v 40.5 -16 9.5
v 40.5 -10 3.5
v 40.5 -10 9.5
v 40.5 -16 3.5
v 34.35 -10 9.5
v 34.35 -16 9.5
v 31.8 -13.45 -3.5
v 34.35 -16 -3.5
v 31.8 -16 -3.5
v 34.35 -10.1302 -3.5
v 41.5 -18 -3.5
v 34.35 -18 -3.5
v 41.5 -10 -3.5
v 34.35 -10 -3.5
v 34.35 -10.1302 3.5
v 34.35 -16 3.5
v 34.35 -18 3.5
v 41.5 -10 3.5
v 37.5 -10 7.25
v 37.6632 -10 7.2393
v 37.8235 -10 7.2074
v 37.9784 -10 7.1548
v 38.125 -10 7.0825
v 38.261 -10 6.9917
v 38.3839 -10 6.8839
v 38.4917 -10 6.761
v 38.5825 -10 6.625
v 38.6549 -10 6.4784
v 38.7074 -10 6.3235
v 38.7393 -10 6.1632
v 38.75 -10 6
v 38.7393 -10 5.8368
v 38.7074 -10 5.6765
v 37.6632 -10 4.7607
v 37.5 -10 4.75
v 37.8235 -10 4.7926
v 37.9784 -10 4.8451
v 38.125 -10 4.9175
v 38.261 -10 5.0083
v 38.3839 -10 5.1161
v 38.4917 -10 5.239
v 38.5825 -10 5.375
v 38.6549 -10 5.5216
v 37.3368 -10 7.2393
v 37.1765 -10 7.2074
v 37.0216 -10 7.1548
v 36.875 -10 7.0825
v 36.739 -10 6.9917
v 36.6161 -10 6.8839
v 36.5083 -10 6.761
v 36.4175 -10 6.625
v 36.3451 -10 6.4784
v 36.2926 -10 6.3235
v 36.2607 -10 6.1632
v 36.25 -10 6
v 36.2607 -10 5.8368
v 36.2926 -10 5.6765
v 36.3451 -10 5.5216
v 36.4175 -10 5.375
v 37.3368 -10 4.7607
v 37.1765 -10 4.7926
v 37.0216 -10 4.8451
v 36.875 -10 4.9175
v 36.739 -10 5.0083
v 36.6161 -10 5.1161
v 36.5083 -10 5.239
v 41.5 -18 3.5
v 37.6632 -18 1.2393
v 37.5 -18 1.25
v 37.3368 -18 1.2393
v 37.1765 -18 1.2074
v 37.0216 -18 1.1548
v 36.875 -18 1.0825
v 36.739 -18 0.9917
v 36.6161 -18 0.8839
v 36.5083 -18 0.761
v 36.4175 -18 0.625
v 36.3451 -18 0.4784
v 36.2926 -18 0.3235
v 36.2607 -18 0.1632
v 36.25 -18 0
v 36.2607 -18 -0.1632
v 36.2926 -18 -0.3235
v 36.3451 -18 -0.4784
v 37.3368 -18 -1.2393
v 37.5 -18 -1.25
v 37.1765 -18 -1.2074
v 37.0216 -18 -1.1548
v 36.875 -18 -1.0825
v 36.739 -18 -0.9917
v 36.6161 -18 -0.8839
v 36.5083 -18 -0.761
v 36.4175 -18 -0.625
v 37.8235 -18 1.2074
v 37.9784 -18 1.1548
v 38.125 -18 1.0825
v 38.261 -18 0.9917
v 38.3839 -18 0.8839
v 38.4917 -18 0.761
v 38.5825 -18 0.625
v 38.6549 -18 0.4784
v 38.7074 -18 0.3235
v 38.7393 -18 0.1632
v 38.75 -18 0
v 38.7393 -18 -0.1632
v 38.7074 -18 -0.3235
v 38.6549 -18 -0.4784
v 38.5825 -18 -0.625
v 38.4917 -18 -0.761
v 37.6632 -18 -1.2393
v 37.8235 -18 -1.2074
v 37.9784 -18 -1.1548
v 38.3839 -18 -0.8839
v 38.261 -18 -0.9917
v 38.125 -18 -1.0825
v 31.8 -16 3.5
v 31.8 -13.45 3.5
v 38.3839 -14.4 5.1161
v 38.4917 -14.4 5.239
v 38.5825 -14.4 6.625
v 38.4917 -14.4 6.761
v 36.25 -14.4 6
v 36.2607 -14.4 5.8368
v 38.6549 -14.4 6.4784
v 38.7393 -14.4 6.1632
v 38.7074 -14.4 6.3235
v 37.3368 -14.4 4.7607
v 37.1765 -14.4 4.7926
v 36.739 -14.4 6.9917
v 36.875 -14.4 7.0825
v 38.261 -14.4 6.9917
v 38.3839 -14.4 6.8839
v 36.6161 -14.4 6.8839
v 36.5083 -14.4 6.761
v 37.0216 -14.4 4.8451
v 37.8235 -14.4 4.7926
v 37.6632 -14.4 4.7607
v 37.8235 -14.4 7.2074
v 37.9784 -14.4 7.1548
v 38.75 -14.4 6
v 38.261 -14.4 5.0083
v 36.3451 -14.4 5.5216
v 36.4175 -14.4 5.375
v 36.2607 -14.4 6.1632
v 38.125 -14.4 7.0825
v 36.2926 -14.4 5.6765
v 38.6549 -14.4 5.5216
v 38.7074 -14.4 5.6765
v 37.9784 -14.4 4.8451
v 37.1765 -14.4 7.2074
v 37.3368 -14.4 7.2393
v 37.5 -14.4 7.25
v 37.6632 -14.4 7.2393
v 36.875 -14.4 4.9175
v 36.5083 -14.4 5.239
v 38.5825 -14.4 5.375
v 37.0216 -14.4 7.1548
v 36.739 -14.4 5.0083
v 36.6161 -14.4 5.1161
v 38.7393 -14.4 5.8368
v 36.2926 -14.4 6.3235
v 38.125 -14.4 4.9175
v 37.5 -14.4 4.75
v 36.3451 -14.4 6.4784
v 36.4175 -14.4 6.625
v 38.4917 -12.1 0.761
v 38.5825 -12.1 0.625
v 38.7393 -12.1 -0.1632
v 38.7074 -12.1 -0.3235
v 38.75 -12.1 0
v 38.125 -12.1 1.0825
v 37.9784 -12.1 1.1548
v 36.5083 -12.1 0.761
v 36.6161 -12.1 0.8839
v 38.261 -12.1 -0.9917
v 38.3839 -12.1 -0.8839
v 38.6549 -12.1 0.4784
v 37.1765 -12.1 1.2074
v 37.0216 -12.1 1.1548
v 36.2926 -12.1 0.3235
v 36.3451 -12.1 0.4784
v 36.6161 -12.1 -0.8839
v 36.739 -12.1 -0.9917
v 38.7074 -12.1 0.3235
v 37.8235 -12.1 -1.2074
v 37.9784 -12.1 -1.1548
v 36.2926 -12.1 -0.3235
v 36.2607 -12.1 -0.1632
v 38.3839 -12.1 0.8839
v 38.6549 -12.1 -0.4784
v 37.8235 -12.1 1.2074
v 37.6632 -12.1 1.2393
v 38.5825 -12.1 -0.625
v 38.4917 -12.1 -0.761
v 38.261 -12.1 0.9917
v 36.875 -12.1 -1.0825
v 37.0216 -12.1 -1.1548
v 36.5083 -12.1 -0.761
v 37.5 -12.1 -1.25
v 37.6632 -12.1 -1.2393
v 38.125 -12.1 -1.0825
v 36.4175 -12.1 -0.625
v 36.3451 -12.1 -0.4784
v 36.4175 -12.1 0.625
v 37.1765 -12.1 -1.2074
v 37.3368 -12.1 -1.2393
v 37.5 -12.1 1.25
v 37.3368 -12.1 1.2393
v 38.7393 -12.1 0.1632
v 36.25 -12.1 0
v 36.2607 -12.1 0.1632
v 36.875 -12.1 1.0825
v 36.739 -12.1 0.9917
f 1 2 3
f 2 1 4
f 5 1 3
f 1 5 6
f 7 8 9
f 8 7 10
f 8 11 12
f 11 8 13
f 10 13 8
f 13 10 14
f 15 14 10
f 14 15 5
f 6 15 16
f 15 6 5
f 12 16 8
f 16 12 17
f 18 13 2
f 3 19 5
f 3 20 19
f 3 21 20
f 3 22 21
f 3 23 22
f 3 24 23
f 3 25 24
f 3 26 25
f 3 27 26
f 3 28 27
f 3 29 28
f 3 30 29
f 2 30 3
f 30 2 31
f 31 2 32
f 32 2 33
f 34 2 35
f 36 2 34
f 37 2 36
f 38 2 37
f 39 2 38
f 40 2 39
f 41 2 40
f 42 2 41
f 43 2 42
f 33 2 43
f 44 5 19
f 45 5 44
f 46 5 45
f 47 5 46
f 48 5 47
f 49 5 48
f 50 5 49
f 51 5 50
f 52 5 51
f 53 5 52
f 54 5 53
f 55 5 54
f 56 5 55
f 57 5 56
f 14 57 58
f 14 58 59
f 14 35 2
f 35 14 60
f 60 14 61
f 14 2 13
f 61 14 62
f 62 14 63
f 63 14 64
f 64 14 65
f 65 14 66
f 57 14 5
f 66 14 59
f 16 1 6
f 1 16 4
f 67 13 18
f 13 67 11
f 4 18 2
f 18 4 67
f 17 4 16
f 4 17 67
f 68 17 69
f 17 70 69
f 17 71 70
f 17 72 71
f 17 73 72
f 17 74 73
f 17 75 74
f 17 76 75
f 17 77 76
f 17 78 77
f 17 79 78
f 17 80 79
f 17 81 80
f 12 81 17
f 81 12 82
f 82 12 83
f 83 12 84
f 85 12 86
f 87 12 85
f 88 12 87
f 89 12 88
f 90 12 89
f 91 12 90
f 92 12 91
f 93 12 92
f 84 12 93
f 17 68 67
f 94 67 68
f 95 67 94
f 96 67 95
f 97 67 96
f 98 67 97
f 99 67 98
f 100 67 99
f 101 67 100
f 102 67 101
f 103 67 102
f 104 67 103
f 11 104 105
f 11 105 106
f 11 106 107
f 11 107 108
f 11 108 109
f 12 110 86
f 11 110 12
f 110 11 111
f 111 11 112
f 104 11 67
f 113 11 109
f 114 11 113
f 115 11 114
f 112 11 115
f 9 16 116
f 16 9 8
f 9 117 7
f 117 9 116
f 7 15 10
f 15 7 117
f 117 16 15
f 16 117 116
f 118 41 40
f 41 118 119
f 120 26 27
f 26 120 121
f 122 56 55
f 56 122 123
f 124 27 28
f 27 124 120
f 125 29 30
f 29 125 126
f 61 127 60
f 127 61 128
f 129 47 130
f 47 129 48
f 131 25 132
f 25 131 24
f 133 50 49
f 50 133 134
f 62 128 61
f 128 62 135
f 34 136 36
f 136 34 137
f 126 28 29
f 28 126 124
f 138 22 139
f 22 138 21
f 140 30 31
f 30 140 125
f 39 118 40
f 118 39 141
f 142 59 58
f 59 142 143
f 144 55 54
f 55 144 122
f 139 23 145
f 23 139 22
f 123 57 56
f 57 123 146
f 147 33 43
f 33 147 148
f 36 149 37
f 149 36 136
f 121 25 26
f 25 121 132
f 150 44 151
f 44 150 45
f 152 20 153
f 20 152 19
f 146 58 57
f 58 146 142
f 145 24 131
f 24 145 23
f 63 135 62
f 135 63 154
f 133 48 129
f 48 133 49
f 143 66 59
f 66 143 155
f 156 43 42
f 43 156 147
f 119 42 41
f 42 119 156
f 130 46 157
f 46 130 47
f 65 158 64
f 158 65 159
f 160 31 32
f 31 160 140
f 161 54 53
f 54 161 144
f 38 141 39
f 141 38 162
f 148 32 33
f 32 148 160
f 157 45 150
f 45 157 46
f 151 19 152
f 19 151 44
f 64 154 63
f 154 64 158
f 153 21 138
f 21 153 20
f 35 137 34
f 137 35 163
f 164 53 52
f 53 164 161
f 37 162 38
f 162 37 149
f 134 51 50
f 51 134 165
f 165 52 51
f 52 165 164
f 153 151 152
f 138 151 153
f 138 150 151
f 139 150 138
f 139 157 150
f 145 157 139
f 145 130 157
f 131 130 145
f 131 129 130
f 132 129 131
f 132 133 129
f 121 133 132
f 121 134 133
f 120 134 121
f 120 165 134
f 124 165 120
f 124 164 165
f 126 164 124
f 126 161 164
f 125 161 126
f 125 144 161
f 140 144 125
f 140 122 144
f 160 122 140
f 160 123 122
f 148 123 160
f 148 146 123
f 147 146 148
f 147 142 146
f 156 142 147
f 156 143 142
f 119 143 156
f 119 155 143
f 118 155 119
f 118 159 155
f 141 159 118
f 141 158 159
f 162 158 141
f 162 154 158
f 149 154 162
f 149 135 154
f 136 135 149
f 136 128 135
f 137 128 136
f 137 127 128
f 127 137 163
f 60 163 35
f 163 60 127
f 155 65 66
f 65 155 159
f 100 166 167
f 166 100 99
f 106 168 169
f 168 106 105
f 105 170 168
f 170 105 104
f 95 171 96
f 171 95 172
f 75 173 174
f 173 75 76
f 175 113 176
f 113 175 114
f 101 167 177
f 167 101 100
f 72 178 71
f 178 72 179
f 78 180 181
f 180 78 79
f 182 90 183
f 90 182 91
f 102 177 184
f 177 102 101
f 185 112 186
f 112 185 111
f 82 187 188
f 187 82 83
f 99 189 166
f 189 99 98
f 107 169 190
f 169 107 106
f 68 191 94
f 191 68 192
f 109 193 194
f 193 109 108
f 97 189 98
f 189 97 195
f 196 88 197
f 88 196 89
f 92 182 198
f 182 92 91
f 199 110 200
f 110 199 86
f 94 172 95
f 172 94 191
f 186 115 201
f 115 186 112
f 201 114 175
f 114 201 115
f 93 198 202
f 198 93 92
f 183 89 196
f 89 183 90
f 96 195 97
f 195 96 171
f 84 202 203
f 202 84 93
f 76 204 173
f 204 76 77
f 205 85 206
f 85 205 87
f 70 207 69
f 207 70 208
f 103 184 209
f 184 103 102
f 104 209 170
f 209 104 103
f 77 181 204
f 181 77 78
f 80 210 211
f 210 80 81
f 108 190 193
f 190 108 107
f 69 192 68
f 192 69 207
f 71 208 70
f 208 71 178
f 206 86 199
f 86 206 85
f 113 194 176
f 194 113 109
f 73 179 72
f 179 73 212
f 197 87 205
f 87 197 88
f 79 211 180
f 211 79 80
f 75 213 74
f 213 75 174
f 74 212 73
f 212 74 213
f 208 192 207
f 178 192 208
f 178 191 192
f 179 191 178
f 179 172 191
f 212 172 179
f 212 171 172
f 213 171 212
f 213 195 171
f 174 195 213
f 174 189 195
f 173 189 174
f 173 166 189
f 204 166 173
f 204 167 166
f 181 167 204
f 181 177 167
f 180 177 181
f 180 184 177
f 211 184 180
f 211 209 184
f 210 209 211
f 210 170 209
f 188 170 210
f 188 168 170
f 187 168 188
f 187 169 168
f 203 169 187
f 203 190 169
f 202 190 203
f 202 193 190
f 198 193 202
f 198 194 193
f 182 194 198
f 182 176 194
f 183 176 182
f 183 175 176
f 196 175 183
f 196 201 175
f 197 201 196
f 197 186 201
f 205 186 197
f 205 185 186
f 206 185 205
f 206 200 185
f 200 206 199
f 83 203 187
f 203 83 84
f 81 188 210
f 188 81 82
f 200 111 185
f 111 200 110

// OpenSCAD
// file: ../../../../../scad/lib/child_interior_mounts.scad
// Confirmed t200 battery/deck interfaces; mm. Plain purchased M3 nut AF5.5/t2.4.
// Shared by bay, removable floor and deck. No printed threads or metal inserts.
ci_box_hx=24;
ci_box_hz=[12,90];
ci_service_x=22.5;
ci_service_z=16;
ci_clear_d=3.4;
ci_nut_af=5.7; // 0.2 mm total clearance over the existing AF5.5 nut model
ci_nut_t=2.6;
ci_ear_depth=8;
ci_ear_outer_x=27.7; // cable rail starts at X28; do not enlarge further
ci_ear_half_z=7;
ci_service_half_z=7;
ci_service_outer_x=26;
ci_service_depth=9.0;
ci_service_nut_y=-36.5;
ci_edge_chamfer=0.3;
ci_edge_fillet_r=0.6;

// Nut flats face +/-X. Axis +Y, pocket is inserted from the outward X side.
module ci_nut_y(af=ci_nut_af,depth=ci_nut_t) {
    rotate([-90,0,0]) rotate([0,0,30])
        cylinder(d=af/cos(30),h=depth,$fn=6);
}

// Rectangular block with 0.3 mm edge relief, preserving its bounding box.
// The central flat faces retain the specified mounting planes.
module ci_chamfer_box(size,c=ci_edge_chamfer) {
    assert(min(size)>2*c);
    hull() {
        translate([c,c,0]) cube([size[0]-2*c,size[1]-2*c,size[2]]);
        translate([c,0,c]) cube([size[0]-2*c,size[1],size[2]-2*c]);
        translate([0,c,c]) cube([size[0],size[1]-2*c,size[2]-2*c]);
    }
}

// Finish an individual prism, with shrink/expand compensation preserving bounds.
// Apply to structural profiles before assembly booleans, never the full model.
module ci_rounded_extrude(h,r=ci_edge_chamfer) {
    assert(h>2*r);
    translate([0,0,r]) minkowski() {
        linear_extrude(h-2*r) offset(delta=-r) children();
        // OpenSCAD's faceted sphere has flattened poles. Compensate along the
        // extrusion axis so flat flange seats remain exactly at Z0 and Zh.
        scale([1,1,1/cos(180/12)]) sphere(r=r,$fn=12);
    }
}
// main file
// RX edge retention with M3 only; existing 2.2 mm PCB holes stay unused.
// Right-hand local part: board edge X=34, deck underside Y=-10.
// Mirror X for the left side; mirror local Z for upper mounting stations.
/* [Part] */
include <../../../../../scad/lib/child_interior_mounts.scad>
part="base"; // [base,cap,base_pair,cap_pair]
pair_pitch=34; // Existing stations at assembly Z140.5 and Z174.5.
edge_relief=0.2;
bridge_x=39.2; // Outside the existing X36 +/-2.55 mm cable corridor.
bridge_outer_x=42.2; // 3 mm bridge; inside tube, below upper flange insertion.
screw_x=37.5;
mount_offset=6;
board_edge=34;
edge_gap=0.35;
toe_x=31.8;
pilot_d=2.5;
clear_d=3.4;
head_clear_d=6.6;
$fn=48;
assert(screw_x-head_clear_d/2>board_edge && head_clear_d>=6.6,
       "M3 head reserve must stay outside the PCB edge");
module clamp_base() difference() {
    union() {
        // Deck-facing flat footprint: print RX-90, Y=-10 on the bed.
        translate([board_edge+edge_gap,-16,-3.5]) finished_box([6.15,6,mount_offset+7]);
        translate([board_edge+edge_gap,-18,-3.5]) finished_box([7.15,8,7]);
        // PCB backing ledge: 45 degree inward growth, contacts board Y=-16.
        translate([0,0,-3.5]) linear_extrude(7)
            polygon([[board_edge+edge_gap+0.1,-10],[board_edge+edge_gap+0.1,-16],
                     [toe_x,-16],[toe_x,-13.45]]);
    }
    // Mounting screw and clamp screw use different axes, never collide.
    translate([screw_x,-9.9,mount_offset]) rotate([90,0,0]) cylinder(d=pilot_d,h=4.5);
    translate([screw_x,-18.1,0]) rotate([-90,0,0]) cylinder(d=pilot_d,h=6);
}
module clamp_cap() difference() {
    union() {
        // Flat outside face: print RX90, Y=-20.6 on the bed.
        translate([toe_x,-20.6,-3.5]) finished_box([9.7,2.6,7]);
        translate([toe_x,-18,-3.5]) finished_box([board_edge+edge_gap-toe_x,0.4,7],0.1);
    }
    translate([screw_x,-20.7,0]) rotate([-90,0,0]) cylinder(d=clear_d,h=3);
    // Head remains outside a flat seat; 6.6 mm clear tool/head cylinder.
}

module finished_box(size,c=edge_relief) {
    if(part=="base_pair" || part=="cap_pair") ci_chamfer_box(size,c);
    else cube(size); // Historical individual variants remain unchanged.
}

// A bridge outside the PCB joins each side's two clamps. Original screw axes,
// board bearing faces and the gap to the board are retained.
module paired_clamp(is_base) {
    difference() {
    union() {
        for (upper=[false,true]) translate([0,0,upper ? pair_pitch : 0])
            scale([1,1,upper ? 1 : -1])
                if (is_base) clamp_base(); else clamp_cap();
        if (is_base)
            translate([bridge_x,-16,0])
                ci_chamfer_box([bridge_outer_x-bridge_x,6,pair_pitch],edge_relief);
        else
            translate([bridge_x,-20.6,0])
                ci_chamfer_box([bridge_outer_x-bridge_x,2.6,pair_pitch],edge_relief);
    }
    for (zz=[0,pair_pitch]) {
        translate([screw_x,is_base ? -18.1 : -20.7,zz]) rotate([-90,0,0])
            cylinder(d=is_base ? pilot_d : clear_d,h=is_base ? 6 : 3);
    }
    }
}
if(part=="base") clamp_base();
if(part=="cap") clamp_cap();
if(part=="base_pair") paired_clamp(true);
if(part=="cap_pair") paired_clamp(false);
